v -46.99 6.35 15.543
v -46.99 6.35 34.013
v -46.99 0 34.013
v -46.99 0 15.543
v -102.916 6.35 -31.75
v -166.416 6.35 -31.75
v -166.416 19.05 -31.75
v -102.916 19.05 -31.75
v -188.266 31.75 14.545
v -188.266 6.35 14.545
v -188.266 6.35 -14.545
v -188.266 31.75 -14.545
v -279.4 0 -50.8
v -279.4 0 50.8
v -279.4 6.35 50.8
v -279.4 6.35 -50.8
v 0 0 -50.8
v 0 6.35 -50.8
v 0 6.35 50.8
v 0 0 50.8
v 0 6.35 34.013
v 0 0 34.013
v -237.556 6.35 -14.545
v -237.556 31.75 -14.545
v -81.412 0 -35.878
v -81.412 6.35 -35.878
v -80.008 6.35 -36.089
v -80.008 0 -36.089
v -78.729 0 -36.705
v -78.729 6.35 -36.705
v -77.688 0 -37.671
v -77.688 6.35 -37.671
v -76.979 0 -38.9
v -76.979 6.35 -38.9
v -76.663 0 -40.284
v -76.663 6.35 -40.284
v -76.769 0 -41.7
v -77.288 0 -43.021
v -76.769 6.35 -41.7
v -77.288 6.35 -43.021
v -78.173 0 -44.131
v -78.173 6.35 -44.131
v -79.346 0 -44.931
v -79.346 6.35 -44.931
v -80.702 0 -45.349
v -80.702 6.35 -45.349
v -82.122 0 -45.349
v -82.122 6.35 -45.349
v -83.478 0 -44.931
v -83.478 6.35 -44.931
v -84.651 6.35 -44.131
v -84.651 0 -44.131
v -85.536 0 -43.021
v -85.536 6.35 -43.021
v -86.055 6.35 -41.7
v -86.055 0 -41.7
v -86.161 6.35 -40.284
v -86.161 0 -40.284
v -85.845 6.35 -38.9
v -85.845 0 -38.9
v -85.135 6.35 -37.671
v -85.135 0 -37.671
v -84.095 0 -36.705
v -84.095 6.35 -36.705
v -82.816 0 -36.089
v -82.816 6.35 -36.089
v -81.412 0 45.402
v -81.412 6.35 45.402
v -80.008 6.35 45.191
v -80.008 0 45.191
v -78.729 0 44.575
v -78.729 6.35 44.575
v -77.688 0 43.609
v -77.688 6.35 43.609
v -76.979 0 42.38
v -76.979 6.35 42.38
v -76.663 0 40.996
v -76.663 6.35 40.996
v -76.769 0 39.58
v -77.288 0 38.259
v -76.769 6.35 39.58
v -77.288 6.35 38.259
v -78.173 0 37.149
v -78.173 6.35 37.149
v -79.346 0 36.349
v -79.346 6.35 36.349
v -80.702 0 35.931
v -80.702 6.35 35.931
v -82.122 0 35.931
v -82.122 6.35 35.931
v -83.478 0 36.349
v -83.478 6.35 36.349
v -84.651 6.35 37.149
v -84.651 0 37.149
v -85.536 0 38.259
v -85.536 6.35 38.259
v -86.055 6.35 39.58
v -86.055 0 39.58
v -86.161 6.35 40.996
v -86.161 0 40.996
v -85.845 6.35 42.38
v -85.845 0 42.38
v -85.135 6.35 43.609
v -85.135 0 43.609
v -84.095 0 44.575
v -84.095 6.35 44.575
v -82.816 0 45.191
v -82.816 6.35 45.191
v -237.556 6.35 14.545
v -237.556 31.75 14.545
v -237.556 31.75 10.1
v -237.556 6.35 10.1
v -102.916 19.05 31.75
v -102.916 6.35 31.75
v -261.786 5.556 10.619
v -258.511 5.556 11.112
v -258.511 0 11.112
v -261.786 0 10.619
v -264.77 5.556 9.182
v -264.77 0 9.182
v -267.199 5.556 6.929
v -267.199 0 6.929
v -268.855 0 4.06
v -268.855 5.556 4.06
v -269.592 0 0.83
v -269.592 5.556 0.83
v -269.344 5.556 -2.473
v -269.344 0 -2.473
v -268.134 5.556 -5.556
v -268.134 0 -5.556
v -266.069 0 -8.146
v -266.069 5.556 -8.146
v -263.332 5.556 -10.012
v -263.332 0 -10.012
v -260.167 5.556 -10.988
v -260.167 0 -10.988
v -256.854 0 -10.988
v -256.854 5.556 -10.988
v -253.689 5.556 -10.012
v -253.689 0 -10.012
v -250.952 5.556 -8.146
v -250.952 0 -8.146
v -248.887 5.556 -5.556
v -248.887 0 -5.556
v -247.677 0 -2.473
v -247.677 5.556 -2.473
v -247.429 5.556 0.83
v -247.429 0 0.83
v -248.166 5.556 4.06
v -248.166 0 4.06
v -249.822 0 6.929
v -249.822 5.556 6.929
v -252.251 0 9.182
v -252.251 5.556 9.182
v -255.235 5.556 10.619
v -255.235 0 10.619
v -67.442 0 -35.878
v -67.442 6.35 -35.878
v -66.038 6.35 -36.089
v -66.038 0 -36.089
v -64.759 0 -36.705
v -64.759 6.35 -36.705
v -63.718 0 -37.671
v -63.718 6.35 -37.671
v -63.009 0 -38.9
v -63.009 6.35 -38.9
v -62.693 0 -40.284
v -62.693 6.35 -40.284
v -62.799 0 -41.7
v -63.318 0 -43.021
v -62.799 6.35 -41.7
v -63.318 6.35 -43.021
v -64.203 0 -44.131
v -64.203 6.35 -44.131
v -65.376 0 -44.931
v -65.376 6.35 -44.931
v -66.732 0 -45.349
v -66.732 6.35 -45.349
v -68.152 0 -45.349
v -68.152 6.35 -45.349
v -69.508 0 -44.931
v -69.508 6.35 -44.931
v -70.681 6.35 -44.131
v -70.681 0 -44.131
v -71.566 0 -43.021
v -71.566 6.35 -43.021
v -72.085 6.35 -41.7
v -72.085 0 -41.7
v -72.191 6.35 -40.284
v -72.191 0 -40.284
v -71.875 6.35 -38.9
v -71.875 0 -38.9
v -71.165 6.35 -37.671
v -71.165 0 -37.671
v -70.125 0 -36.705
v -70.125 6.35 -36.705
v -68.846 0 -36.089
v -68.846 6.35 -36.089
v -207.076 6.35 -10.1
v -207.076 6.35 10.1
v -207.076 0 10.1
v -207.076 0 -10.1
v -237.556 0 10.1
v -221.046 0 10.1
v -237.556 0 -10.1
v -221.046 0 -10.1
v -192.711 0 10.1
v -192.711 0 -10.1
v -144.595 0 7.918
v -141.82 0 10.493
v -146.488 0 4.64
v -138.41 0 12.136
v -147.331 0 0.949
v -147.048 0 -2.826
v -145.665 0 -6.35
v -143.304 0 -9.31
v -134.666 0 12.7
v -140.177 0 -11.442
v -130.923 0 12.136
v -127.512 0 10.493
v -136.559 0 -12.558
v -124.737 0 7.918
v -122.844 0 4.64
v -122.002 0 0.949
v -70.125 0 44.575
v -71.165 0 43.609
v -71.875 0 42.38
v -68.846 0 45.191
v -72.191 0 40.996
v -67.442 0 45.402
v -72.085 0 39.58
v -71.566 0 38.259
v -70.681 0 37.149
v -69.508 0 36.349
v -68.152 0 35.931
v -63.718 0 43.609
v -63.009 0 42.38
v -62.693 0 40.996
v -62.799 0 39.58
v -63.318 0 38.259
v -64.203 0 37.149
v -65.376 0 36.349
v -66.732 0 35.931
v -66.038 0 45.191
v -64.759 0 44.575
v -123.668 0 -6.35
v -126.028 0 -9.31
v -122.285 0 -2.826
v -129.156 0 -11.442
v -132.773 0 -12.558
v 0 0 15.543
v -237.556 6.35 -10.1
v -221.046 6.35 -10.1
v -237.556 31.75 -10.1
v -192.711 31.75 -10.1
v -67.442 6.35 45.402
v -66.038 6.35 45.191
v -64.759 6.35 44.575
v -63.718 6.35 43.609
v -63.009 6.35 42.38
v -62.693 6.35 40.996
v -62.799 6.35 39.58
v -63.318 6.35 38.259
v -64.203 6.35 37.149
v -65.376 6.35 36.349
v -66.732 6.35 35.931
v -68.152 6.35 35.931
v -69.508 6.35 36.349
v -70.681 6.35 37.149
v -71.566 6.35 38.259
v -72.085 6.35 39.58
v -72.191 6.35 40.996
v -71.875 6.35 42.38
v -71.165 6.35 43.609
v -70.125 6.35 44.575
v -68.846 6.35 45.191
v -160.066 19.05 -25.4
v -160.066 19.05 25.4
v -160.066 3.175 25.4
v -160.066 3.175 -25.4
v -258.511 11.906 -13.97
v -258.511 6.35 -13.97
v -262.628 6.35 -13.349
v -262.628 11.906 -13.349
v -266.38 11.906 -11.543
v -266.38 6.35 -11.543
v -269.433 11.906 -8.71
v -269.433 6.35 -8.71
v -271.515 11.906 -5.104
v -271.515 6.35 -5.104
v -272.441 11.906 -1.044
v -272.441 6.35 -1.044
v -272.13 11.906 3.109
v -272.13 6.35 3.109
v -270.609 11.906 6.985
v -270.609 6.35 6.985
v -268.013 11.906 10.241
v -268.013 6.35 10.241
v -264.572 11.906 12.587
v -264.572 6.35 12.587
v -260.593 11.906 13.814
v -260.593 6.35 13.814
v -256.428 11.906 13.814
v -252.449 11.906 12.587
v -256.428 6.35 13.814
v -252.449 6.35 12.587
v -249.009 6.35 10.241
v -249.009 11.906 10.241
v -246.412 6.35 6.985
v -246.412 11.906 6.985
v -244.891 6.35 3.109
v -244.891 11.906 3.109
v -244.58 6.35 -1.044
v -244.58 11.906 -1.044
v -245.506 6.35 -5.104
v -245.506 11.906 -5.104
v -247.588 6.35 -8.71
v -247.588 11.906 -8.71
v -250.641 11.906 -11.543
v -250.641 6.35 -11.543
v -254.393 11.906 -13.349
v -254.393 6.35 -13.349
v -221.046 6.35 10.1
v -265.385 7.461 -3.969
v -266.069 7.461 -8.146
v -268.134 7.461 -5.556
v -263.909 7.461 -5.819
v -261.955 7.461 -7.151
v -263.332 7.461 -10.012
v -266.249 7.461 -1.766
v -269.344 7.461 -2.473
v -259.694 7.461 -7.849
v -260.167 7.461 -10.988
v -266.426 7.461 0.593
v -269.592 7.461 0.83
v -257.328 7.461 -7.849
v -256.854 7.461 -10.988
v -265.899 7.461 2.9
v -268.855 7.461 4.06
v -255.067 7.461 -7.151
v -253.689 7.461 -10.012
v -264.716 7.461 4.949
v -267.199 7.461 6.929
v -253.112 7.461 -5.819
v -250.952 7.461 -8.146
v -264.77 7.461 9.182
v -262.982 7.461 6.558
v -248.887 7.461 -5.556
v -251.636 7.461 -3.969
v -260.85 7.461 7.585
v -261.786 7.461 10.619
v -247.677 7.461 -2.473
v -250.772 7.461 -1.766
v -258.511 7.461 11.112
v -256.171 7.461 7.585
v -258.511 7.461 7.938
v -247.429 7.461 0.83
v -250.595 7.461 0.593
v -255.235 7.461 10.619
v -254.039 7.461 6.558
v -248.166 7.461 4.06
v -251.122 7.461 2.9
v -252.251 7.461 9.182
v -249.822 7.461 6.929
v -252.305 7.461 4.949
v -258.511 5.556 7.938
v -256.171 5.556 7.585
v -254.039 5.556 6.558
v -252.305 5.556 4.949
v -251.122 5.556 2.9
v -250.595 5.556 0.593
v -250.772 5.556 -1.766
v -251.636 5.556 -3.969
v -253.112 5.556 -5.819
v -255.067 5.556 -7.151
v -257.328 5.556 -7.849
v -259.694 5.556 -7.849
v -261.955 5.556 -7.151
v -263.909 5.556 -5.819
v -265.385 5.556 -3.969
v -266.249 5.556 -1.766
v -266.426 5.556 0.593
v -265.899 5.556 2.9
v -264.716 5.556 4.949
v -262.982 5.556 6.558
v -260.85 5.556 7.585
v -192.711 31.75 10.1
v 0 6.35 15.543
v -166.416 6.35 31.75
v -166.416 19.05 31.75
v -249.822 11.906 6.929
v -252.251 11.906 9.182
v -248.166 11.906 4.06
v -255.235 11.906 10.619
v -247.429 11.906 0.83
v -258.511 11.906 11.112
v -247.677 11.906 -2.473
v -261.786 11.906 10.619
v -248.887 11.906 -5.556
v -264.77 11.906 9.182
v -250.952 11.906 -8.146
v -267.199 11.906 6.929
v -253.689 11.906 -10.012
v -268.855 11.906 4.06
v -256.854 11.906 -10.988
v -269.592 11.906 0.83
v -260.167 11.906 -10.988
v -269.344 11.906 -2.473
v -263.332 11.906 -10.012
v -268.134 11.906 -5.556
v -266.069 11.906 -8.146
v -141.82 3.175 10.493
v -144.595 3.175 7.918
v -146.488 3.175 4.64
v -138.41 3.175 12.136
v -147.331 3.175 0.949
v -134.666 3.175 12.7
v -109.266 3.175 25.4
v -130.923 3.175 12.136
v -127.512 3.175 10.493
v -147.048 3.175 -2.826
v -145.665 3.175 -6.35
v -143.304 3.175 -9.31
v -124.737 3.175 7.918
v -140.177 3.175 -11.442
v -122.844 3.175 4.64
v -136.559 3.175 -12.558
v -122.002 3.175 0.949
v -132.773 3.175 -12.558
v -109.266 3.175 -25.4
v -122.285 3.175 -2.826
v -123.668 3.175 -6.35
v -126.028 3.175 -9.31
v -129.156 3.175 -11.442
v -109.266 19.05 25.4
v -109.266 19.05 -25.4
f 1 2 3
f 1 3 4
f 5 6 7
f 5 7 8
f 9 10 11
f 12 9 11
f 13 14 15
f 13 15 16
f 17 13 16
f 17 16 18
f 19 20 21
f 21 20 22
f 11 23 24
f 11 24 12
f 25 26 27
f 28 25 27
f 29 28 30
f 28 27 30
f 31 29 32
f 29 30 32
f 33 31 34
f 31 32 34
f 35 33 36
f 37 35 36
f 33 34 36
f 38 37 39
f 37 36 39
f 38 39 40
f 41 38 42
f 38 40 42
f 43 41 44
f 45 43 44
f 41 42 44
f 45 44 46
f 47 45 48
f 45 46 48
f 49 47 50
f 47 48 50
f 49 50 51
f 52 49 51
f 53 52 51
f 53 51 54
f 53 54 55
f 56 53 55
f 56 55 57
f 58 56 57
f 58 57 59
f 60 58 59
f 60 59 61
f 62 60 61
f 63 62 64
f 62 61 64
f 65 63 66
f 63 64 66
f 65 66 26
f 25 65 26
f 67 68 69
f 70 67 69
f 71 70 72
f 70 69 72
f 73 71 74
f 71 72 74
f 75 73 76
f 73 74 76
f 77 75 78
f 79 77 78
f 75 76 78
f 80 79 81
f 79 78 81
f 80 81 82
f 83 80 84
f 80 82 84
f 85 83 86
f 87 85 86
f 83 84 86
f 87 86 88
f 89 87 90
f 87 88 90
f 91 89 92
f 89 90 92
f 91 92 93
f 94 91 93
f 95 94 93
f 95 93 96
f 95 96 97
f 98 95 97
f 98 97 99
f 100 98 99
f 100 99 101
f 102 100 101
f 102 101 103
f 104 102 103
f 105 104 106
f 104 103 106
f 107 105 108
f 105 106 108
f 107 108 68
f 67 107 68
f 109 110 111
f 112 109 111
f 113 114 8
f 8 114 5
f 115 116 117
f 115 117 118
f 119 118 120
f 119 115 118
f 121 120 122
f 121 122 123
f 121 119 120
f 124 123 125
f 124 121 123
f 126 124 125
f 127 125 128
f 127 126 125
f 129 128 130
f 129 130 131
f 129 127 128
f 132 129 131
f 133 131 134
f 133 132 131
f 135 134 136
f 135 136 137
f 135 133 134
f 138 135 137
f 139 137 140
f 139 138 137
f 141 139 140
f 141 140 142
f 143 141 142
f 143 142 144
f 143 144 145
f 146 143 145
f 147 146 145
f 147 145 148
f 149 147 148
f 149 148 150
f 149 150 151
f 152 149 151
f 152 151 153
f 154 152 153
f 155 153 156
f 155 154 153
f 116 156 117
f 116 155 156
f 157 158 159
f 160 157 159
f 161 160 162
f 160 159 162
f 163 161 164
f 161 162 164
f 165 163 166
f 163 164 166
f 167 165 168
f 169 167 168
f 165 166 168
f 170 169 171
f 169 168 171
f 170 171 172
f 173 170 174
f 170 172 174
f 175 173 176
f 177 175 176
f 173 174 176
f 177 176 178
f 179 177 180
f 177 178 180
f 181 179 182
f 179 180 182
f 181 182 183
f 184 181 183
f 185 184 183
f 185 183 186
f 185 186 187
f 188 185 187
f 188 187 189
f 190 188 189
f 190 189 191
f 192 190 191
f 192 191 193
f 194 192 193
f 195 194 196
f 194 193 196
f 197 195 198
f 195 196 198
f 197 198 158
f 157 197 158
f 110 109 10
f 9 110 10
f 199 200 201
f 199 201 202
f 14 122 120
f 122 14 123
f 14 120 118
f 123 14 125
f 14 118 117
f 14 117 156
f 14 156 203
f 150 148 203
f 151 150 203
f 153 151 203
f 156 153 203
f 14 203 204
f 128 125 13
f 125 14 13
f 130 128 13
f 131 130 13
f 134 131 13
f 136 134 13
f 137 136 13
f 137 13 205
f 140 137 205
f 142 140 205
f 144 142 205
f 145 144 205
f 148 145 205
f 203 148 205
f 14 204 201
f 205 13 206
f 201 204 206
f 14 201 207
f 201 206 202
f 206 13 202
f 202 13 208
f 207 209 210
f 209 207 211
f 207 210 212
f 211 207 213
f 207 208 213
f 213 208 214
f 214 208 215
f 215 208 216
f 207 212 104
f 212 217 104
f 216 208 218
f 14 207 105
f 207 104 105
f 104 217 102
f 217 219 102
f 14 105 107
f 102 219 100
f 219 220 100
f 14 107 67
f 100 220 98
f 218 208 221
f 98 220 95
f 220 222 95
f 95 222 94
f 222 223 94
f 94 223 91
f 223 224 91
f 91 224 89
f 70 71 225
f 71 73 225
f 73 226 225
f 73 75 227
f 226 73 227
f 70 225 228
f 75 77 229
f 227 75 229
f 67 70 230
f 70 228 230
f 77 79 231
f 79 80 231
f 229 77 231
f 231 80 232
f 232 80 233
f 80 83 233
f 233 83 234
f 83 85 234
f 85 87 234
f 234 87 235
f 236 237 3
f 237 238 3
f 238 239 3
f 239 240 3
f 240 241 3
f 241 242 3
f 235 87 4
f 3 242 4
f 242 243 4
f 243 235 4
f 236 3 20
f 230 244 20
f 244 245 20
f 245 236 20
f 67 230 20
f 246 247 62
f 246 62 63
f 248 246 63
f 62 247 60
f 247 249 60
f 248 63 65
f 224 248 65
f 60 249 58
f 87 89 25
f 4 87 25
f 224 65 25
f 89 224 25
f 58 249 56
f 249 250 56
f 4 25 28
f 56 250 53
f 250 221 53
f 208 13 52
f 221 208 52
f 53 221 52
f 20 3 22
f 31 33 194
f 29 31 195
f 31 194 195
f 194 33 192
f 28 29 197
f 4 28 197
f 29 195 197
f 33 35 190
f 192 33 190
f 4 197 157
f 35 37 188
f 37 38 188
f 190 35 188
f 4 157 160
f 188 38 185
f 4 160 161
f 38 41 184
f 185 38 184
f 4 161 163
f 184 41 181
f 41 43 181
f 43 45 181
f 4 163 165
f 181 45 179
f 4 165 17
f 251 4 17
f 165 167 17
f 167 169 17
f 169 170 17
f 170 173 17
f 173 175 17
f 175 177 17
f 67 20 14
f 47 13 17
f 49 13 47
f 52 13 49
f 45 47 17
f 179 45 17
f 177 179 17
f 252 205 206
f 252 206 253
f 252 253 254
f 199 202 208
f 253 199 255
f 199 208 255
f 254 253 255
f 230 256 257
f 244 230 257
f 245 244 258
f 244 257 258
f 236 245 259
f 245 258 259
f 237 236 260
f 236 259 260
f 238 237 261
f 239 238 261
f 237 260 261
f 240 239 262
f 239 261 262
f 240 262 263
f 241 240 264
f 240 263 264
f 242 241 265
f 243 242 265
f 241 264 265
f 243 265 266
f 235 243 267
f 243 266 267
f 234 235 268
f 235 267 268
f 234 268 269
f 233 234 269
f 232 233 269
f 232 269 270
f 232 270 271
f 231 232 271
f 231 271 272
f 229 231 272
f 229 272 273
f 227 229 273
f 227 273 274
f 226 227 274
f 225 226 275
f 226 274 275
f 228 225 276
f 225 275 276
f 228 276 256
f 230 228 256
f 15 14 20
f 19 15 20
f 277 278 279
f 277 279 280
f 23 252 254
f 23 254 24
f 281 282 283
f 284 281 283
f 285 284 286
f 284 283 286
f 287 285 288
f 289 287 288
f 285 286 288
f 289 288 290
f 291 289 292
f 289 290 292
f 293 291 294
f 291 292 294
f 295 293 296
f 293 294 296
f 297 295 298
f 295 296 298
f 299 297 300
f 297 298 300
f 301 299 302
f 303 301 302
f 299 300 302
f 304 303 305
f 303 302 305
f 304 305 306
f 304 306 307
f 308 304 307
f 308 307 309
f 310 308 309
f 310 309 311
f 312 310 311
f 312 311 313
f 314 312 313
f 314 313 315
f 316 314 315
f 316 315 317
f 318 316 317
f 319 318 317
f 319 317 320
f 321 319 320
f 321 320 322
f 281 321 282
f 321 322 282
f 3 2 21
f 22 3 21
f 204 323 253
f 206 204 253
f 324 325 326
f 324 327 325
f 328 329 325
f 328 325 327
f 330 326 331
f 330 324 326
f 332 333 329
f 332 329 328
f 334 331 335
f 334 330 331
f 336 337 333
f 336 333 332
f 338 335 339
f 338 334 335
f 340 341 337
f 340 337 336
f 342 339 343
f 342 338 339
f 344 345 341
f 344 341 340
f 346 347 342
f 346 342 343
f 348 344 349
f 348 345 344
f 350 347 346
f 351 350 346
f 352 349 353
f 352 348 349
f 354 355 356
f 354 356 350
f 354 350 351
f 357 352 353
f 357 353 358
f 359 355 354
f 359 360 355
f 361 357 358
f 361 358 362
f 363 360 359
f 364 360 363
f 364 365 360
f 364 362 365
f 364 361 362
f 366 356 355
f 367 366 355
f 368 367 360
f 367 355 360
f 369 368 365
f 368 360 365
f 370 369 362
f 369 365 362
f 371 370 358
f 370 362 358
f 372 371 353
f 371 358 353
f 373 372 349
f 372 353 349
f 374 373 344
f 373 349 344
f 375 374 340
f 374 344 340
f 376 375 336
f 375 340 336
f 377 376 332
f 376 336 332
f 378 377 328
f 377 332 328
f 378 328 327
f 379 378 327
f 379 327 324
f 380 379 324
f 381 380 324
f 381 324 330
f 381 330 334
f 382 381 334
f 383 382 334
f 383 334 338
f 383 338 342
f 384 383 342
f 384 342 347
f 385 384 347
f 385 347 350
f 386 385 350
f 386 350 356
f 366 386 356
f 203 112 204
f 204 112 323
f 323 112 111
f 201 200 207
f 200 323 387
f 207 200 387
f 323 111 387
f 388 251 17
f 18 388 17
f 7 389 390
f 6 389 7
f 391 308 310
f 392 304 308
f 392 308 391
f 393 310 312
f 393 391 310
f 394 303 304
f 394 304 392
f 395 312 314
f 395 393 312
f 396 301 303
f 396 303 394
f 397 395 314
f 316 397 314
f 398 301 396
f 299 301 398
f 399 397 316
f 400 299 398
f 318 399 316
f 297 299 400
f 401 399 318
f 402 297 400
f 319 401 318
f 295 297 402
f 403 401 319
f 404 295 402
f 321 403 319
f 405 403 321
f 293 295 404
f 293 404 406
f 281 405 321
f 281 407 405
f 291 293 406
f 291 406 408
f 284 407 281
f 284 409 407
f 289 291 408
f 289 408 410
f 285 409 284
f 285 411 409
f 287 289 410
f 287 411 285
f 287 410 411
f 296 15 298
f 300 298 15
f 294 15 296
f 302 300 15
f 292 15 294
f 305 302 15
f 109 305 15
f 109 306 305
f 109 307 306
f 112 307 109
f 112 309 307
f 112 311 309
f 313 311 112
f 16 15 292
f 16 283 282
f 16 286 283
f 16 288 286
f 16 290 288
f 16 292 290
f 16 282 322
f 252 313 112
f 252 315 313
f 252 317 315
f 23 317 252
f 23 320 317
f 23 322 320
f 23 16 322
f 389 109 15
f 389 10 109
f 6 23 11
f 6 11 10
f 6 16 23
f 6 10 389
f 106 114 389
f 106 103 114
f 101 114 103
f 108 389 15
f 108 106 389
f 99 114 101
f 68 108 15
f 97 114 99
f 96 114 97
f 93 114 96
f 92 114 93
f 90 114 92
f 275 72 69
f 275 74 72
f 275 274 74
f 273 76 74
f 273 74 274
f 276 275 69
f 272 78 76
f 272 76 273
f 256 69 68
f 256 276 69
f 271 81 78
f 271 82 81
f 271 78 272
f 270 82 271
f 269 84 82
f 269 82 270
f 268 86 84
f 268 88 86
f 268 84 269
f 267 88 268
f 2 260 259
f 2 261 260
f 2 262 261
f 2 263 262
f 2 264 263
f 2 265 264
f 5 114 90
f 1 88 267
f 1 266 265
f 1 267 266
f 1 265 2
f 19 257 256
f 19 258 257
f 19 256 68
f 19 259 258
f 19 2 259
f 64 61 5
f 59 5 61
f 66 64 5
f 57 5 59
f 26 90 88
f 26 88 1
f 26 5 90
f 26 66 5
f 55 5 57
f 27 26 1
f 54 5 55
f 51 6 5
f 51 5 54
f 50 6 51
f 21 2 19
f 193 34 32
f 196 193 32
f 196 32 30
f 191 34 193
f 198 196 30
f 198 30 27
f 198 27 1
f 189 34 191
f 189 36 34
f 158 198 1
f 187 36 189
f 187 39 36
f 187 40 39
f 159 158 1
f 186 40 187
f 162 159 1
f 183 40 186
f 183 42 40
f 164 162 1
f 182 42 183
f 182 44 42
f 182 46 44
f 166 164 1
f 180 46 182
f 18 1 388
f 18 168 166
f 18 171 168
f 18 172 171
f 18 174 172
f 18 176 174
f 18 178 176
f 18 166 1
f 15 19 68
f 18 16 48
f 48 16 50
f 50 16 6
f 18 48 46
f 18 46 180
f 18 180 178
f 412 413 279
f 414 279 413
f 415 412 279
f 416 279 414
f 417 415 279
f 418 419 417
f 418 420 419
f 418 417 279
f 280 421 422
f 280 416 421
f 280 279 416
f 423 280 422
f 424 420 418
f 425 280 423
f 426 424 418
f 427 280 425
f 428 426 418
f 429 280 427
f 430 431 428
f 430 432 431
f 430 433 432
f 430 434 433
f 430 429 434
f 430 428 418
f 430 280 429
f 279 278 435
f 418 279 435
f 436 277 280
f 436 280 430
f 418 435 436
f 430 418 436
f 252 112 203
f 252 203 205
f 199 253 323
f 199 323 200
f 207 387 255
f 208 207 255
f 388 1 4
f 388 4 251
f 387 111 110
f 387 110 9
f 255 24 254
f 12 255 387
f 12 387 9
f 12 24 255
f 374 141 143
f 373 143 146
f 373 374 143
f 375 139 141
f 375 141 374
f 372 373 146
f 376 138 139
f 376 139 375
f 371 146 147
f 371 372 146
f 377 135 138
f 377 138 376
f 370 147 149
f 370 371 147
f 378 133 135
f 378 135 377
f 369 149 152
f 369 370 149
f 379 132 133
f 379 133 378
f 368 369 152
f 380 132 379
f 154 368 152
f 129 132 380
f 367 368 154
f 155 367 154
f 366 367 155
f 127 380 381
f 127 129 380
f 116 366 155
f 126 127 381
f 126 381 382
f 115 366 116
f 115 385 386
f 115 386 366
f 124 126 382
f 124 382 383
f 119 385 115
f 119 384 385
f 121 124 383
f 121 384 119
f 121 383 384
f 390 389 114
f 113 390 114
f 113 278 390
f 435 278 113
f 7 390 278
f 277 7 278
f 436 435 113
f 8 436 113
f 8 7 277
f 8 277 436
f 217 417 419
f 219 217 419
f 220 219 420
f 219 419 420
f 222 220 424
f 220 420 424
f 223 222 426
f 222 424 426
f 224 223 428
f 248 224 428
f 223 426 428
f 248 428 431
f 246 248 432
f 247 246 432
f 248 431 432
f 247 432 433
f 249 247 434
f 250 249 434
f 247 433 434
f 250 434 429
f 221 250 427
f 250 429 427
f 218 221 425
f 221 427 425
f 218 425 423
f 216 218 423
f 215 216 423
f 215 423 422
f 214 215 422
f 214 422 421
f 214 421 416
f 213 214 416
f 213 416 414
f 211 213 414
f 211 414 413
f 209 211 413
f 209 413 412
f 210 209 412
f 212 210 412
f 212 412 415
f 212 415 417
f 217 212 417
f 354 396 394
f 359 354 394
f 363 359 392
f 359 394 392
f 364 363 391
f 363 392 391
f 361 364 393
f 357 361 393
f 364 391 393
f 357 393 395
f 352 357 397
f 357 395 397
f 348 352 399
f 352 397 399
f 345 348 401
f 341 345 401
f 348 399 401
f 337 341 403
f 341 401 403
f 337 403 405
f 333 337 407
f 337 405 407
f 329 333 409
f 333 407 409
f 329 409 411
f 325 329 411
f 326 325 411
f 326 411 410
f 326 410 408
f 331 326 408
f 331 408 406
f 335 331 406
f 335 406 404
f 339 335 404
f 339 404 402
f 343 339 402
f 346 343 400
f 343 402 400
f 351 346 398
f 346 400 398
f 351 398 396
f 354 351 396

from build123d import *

# Parameters (mm, degrees)
SKETCH1_W            = 279.4
SKETCH1_H            = 101.6
BOSS_EXTRUDE1_DEPTH  = 6.35
SKETCH2_R            = 13.97
BOSS_EXTRUDE3_DEPTH  = 5.55625
SKETCH9_R            = 11.1125
CUT_EXTRUDE4_DEPTH   = 4.445
CUT_EXTRUDE5_START   = -5.55625
SKETCH10_R           = 11.1125
CUT_EXTRUDE5_DEPTH   = 5.55625
SKETCH11_R           = 7.9375
CUT_EXTRUDE6_DEPTH   = 285.078633923
SKETCH12_R           = 12.7
CUT_EXTRUDE7_DEPTH   = 285.051619429
SKETCH22_W           = 63.5
SKETCH22_H           = 63.5
BOSS_EXTRUDE7_DEPTH  = 12.7
SKETCH25_W           = 50.8
SKETCH25_H           = 50.8
CUT_EXTRUDE11_DEPTH  = 15.875
SKETCH32_R           = 4.7625
CUT_EXTRUDE12_DEPTH  = 6.35
SKETCH38_W           = 46.99
SKETCH38_H           = 18.470251096
CUT_EXTRUDE13_DEPTH  = 6.35
SKETCH50_W           = 49.2899954
SKETCH50_H           = 29.09000024
BOSS_EXTRUDE14_DEPTH = 25.4
SKETCH49_W           = 40.3999954
SKETCH49_H           = 20.20000024
CUT_EXTRUDE19_DEPTH  = 286.114292872
SKETCH52_W           = 20.20000024
SKETCH52_H           = 25.4
CUT_EXTRUDE20_DEPTH  = 4.445
SKETCH53_W           = 44.8449954
SKETCH53_H           = 20.20000024
BOSS_EXTRUDE15_DEPTH = 4.760622178
SKETCH55_W           = 44.8449954
SKETCH55_H           = 20.20000024
CUT_EXTRUDE21_DEPTH  = 285.729668136
SKETCH56_W           = 13.97
SKETCH56_H           = 20.20000024
BOSS_EXTRUDE16_DEPTH = 6.35


with BuildPart() as part:
    # Sketch1 → Boss-Extrude1 (new body)
    with BuildSketch(Plane(origin=(0, 0, 0), x_dir=(1, 0, 0), z_dir=(0, 1, 0))):
        with Locations((-139.7, 0)):
            Rectangle(SKETCH1_W, SKETCH1_H)
    extrude(amount=BOSS_EXTRUDE1_DEPTH)

    # Sketch2 → Boss-Extrude3 (add)
    with BuildSketch(Plane(origin=(0, 6.35, 0), x_dir=(1, 0, 0), z_dir=(0, 1, 0))):
        with Locations(Location((-258.510557857, 0, 0), (0, 0, 90))):
            Circle(SKETCH2_R)
    extrude(amount=BOSS_EXTRUDE3_DEPTH)

    # Sketch9 → Cut-Extrude4 (cut)
    with BuildSketch(Plane(origin=(0, 11.90625, 0), x_dir=(1, 0, 0), z_dir=(0, 1, 0))):
        with Locations(Location((-258.510557857, 0, 0), (0, 0, 270))):
            Circle(SKETCH9_R)
    extrude(amount=-CUT_EXTRUDE4_DEPTH, mode=Mode.SUBTRACT)

    # Sketch10 → Cut-Extrude5 (cut)
    with BuildSketch(Plane(origin=(0, 0, 0), x_dir=(-1, 0, 0), z_dir=(0, -1, 0)).offset(CUT_EXTRUDE5_START)):
        with Locations(Location((258.510557857, 0, 0), (0, 0, 270))):
            Circle(SKETCH10_R)
    extrude(amount=CUT_EXTRUDE5_DEPTH, mode=Mode.SUBTRACT)

    # Sketch11 → Cut-Extrude6 (cut, through all)
    with BuildSketch(Plane(origin=(0, 7.46125, 0), x_dir=(1, 0, 0), z_dir=(0, 1, 0))):
        with Locations(Location((-258.510557857, 0, 0), (0, 0, 270))):
            Circle(SKETCH11_R)
    extrude(amount=-CUT_EXTRUDE6_DEPTH, mode=Mode.SUBTRACT)

    # Sketch12 → Cut-Extrude7 (cut, through all)
    with BuildSketch(Plane(origin=(0, 6.35, 0), x_dir=(1, 0, 0), z_dir=(0, 1, 0))):
        with Locations(Location((-134.666203771, 0, 0), (0, 0, 270))):
            Circle(SKETCH12_R)
    extrude(amount=-CUT_EXTRUDE7_DEPTH, mode=Mode.SUBTRACT)

    # Sketch22 → Boss-Extrude7 (add)
    with BuildSketch(Plane(origin=(0, 6.35, 0), x_dir=(1, 0, 0), z_dir=(0, 1, 0))):
        with Locations((-134.666203771, 0)):
            Rectangle(SKETCH22_W, SKETCH22_H)
    extrude(amount=BOSS_EXTRUDE7_DEPTH)

    # Sketch25 → Cut-Extrude11 (cut)
    with BuildSketch(Plane(origin=(0, 19.05, 0), x_dir=(1, 0, 0), z_dir=(0, 1, 0))):
        with Locations((-134.666203771, 0)):
            Rectangle(SKETCH25_W, SKETCH25_H)
    extrude(amount=-CUT_EXTRUDE11_DEPTH, mode=Mode.SUBTRACT)

    # Sketch32 → Cut-Extrude12 (cut)
    with BuildSketch(Plane(origin=(0, 6.35, 0), x_dir=(1, 0, 0), z_dir=(0, 1, 0))):
        with Locations(Location((-67.44195898, -40.64, 0), (0, 0, 270))):
            Circle(SKETCH32_R)
        with Locations(Location((-81.41195898, -40.64, 0), (0, 0, 270))):
            Circle(SKETCH32_R)
        with Locations(Location((-67.44195898, 40.64, 0), (0, 0, 270))):
            Circle(SKETCH32_R)
        with Locations(Location((-81.41195898, 40.64, 0), (0, 0, 270))):
            Circle(SKETCH32_R)
    extrude(amount=-CUT_EXTRUDE12_DEPTH, mode=Mode.SUBTRACT)

    # Sketch38 → Cut-Extrude13 (cut)
    with BuildSketch(Plane(origin=(0, 6.35, 0), x_dir=(1, 0, 0), z_dir=(0, 1, 0))):
        with Locations((-23.495, -24.777709652)):
            Rectangle(SKETCH38_W, SKETCH38_H)
    extrude(amount=-CUT_EXTRUDE13_DEPTH, mode=Mode.SUBTRACT)

    # Sketch50 → Boss-Extrude14 (add)
    with BuildSketch(Plane(origin=(0, 6.35, 0), x_dir=(1, 0, 0), z_dir=(0, 1, 0))):
        with Locations((-212.910560157, 0)):
            Rectangle(SKETCH50_W, SKETCH50_H)
    extrude(amount=BOSS_EXTRUDE14_DEPTH)

    # Sketch49 → Cut-Extrude19 (cut, through all)
    with BuildSketch(Plane(origin=(0, 6.35, 0), x_dir=(1, 0, 0), z_dir=(0, 1, 0))):
        with Locations((-212.910560157, 0)):
            Rectangle(SKETCH49_W, SKETCH49_H)
    extrude(amount=CUT_EXTRUDE19_DEPTH, mode=Mode.SUBTRACT)

    # Sketch52 → Cut-Extrude20 (cut)
    with BuildSketch(Plane(origin=(-233.110557857, 0, 0), x_dir=(0, 0, -1), z_dir=(1, 0, 0))):
        with Locations((0, 19.05)):
            Rectangle(SKETCH52_W, SKETCH52_H)
    extrude(amount=-CUT_EXTRUDE20_DEPTH, mode=Mode.SUBTRACT)

    # Sketch53 → Boss-Extrude15 (add)
    with BuildSketch(Plane(origin=(0, 6.35, 0), x_dir=(1, 0, 0), z_dir=(0, 1, 0))):
        with Locations((-215.133060157, 0)):
            Rectangle(SKETCH53_W, SKETCH53_H)
    extrude(amount=BOSS_EXTRUDE15_DEPTH)

    # Sketch55 → Cut-Extrude21 (cut, through all)
    with BuildSketch(Plane(origin=(0, 11.110622178, 0), x_dir=(1, 0, 0), z_dir=(0, 1, 0))):
        with Locations((-215.133060157, 0)):
            Rectangle(SKETCH55_W, SKETCH55_H)
    extrude(amount=-CUT_EXTRUDE21_DEPTH, mode=Mode.SUBTRACT)

    # Sketch56 → Boss-Extrude16 (add)
    with BuildSketch(Plane(origin=(0, 6.35, 0), x_dir=(1, 0, 0), z_dir=(0, 1, 0))):
        with Locations((-214.060557857, 0)):
            Rectangle(SKETCH56_W, SKETCH56_H)
    extrude(amount=-BOSS_EXTRUDE16_DEPTH)


solid = part.part
